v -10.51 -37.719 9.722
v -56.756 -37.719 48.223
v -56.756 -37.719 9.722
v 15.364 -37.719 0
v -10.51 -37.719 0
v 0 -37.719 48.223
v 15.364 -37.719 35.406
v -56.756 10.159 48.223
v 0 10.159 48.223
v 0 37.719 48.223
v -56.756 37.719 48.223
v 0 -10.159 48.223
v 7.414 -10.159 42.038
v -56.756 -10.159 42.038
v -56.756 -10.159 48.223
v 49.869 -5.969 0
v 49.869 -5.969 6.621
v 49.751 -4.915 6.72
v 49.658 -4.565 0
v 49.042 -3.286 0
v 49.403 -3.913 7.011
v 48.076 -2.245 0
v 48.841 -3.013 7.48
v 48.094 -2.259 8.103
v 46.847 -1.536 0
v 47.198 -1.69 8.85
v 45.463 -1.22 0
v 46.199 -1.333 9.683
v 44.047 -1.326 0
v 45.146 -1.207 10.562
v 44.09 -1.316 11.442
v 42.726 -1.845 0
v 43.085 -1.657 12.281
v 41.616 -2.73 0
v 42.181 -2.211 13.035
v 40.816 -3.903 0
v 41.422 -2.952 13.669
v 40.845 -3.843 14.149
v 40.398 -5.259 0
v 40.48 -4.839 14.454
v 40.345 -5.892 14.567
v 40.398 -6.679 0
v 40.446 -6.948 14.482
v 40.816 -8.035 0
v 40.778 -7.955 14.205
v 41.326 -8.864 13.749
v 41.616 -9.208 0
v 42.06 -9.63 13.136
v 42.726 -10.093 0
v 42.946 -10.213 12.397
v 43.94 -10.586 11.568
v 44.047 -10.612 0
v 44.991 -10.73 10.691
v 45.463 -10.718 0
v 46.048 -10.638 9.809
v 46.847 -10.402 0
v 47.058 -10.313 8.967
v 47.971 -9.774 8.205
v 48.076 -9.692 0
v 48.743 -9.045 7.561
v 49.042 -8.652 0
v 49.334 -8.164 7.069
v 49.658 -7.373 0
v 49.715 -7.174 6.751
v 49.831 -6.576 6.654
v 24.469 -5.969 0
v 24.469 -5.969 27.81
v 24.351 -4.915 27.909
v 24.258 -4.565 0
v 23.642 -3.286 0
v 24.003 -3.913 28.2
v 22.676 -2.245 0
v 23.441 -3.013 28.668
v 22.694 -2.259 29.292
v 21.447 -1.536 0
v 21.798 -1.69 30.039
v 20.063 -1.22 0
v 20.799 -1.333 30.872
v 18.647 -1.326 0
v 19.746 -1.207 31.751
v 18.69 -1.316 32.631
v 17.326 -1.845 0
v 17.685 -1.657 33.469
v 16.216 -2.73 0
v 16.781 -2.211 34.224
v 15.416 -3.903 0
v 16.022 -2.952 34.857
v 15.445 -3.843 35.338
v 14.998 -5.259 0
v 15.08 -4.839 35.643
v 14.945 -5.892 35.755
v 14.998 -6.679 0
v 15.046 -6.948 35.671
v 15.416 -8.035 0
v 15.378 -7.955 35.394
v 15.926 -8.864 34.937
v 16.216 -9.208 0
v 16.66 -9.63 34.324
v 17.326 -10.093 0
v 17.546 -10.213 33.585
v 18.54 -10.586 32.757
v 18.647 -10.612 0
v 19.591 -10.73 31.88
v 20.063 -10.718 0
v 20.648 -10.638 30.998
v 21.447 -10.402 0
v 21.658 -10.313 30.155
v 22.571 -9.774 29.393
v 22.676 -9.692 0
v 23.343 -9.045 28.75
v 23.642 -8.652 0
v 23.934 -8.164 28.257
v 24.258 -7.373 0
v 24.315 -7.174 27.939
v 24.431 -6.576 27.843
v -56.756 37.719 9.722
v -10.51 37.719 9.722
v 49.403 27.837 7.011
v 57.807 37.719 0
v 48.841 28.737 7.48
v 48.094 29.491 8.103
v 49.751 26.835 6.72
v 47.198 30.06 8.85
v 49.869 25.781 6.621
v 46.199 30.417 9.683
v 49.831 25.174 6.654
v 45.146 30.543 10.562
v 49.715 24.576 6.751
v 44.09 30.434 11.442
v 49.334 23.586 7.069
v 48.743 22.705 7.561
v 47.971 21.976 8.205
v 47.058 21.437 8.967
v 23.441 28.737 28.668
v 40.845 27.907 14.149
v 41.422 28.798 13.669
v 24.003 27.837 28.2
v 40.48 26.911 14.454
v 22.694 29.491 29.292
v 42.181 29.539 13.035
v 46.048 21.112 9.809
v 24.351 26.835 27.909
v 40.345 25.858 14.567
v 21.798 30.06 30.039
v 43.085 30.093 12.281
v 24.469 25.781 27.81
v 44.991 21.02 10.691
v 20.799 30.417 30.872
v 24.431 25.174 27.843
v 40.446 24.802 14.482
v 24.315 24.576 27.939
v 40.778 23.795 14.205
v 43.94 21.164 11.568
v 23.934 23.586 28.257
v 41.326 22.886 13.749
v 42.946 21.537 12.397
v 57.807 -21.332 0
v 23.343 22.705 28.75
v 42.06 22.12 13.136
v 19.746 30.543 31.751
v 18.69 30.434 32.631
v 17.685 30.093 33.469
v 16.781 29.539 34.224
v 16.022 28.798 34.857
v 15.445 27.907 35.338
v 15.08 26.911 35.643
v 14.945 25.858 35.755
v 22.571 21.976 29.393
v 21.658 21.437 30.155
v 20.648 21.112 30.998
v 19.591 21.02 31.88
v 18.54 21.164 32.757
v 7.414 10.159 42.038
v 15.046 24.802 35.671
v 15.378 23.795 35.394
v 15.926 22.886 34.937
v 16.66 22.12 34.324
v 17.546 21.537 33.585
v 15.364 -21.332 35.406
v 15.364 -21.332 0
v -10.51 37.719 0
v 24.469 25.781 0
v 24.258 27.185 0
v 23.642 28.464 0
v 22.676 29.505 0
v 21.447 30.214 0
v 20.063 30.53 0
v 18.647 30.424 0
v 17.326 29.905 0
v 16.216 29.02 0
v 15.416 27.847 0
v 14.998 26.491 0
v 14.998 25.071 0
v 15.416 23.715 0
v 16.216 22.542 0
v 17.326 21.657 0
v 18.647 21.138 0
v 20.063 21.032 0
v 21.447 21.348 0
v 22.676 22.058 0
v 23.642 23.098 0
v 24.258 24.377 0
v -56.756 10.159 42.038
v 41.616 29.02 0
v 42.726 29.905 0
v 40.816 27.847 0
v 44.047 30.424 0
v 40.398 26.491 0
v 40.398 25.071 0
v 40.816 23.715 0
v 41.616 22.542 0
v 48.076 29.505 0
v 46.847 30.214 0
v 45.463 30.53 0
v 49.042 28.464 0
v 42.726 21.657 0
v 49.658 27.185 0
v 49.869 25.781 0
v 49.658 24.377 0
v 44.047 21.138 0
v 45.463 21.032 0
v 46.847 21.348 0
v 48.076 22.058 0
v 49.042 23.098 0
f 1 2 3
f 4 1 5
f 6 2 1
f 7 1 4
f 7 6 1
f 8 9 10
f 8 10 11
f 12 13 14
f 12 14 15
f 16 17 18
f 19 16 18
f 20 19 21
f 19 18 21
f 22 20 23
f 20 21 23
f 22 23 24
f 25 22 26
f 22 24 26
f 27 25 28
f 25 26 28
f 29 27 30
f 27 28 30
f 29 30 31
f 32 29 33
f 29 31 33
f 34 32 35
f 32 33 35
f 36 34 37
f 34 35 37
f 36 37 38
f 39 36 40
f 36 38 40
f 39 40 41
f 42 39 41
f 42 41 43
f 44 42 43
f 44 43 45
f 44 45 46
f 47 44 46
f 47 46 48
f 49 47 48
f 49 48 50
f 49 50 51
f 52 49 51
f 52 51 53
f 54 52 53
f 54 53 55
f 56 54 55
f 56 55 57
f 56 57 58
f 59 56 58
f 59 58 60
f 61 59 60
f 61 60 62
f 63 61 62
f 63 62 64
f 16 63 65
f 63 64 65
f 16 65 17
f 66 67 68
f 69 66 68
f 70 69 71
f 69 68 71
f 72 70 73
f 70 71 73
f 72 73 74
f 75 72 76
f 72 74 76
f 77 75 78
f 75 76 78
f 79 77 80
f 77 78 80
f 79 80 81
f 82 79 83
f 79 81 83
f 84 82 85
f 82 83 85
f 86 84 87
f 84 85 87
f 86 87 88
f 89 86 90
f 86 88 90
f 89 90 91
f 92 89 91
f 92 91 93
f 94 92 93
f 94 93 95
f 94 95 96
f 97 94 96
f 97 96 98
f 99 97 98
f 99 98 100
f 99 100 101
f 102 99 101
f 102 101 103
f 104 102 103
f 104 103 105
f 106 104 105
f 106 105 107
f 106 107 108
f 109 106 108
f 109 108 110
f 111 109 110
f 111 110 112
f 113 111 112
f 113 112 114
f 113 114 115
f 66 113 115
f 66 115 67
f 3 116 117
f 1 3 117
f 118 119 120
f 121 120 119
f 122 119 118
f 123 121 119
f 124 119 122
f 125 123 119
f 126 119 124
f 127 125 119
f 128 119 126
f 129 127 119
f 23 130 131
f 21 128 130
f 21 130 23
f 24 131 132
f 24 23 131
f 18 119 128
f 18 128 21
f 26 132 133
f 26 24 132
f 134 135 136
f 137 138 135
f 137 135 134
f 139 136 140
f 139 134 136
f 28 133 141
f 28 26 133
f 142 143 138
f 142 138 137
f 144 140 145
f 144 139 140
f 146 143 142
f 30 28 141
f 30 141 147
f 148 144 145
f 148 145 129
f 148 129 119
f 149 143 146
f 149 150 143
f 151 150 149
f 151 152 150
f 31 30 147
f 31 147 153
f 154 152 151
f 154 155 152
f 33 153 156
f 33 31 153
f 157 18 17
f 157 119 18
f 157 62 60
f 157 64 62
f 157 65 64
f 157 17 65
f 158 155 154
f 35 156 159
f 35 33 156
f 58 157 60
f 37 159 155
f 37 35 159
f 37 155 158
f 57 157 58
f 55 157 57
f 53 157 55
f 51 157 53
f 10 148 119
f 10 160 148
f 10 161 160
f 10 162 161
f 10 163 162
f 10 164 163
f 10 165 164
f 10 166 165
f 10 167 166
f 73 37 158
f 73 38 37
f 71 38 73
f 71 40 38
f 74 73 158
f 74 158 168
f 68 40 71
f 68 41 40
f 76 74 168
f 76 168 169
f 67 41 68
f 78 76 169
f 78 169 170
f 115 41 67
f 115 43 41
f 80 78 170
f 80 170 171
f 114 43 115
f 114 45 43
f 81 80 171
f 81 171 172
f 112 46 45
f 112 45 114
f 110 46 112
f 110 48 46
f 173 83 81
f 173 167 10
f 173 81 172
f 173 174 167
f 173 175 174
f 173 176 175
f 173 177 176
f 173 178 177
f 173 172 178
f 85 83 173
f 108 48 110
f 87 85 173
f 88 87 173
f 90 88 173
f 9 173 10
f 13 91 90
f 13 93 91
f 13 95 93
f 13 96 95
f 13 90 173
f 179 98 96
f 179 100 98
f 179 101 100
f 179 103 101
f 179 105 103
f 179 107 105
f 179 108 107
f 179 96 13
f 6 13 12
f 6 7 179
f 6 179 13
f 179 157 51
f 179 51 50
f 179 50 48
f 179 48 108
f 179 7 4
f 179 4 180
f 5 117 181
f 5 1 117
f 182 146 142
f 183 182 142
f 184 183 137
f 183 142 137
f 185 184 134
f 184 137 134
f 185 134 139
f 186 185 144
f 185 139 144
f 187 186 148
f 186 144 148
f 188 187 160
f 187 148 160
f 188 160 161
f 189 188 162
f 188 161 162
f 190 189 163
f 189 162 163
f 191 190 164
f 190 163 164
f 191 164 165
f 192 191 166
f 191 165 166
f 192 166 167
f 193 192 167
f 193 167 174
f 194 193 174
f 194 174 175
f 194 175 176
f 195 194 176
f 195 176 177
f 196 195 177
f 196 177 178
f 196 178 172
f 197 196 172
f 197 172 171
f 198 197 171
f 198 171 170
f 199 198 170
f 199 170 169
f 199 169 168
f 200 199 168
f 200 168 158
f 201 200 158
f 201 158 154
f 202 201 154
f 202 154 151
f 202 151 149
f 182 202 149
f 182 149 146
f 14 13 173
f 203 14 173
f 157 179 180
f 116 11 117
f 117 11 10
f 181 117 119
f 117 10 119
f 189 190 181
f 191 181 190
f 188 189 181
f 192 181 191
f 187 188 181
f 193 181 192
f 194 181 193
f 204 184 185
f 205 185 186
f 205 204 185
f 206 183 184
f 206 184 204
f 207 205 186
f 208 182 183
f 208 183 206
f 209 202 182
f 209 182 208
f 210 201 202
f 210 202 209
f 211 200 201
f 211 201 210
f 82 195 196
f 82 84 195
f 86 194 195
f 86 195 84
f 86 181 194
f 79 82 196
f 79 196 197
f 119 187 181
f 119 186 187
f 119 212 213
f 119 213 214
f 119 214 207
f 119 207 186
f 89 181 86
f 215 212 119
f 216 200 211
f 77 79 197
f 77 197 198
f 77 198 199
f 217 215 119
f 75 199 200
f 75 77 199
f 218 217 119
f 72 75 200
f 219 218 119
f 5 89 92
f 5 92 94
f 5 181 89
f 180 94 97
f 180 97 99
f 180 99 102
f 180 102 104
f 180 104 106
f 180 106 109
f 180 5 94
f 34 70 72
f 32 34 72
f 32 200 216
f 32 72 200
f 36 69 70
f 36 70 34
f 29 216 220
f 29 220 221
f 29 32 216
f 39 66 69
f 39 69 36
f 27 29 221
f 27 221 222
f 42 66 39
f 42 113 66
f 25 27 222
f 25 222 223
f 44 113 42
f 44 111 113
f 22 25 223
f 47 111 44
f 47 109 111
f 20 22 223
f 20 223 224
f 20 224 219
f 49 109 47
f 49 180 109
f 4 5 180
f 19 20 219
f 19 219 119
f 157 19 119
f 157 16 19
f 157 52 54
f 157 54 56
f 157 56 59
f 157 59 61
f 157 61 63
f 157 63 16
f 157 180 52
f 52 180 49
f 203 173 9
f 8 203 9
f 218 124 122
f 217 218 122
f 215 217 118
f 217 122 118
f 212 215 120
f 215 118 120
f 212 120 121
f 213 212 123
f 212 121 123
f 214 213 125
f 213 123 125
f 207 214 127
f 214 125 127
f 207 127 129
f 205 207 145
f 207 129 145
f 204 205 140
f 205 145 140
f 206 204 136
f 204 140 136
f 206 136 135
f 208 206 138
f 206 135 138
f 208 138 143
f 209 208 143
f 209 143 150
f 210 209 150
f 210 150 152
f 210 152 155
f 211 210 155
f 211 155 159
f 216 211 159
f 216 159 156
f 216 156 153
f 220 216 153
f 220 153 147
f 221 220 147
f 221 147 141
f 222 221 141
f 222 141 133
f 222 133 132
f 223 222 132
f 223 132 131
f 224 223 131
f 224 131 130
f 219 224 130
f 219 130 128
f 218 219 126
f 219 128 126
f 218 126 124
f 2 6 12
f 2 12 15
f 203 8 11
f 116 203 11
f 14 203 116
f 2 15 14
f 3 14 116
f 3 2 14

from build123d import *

# Parameters (mm, degrees)
F1_DEPTH      = 37.718965
F2_W          = 42.4428796396
F2_H          = 16.3872130215
F3_DEPTH      = 48.2236520451
F4_W          = 20.3172173351
F4_H          = 6.184624848
F5_DEPTH      = 56.7568631301
F5_DEPTH_BACK = 57.8078979084
F6_R          = 4.7625
F7_DEPTH      = 48.2236520451


with BuildPart() as f1:
    # F0 (on Front) → F1 (new body, symmetric)
    with BuildSketch(Plane.XZ):
        Polygon((-10.5103449896, 0), (57.8068979084, 0), (0, 48.2226520451), (-56.7558631301, 48.2226520451), (-56.7558631301, 9.7220684111), (-10.5103449896, 9.7220684111), align=None)
    extrude(amount=F1_DEPTH, both=True)

    # F2 (on face) → F3 (cut, through all)
    with BuildSketch(Plane.XY.offset(48.2226520451)):
        with Locations((36.5854580887, -29.5253584892)):
            Rectangle(F2_W, F2_H)
    extrude(amount=-F3_DEPTH, mode=Mode.SUBTRACT)

    # F4 (on Right) → F5 (cut, two sides)
    with BuildSketch(Plane.YZ) as f5_sk:
        with Locations((0, 45.1303396211)):
            Rectangle(F4_W, F4_H)
    extrude(amount=-F5_DEPTH, mode=Mode.SUBTRACT)
    extrude(f5_sk.sketch, amount=F5_DEPTH_BACK, mode=Mode.SUBTRACT)

    # F6 (on face) → F7 (cut, through all)
    with BuildSketch(Plane.XY.offset(48.2226520451)):
        with Locations((45.1068979084, 25.781035)):
            Circle(F6_R)
        with Locations((19.7068979084, 25.781035)):
            Circle(F6_R)
        with Locations((19.7068979084, -5.968965)):
            Circle(F6_R)
        with Locations((45.1068979084, -5.968965)):
            Circle(F6_R)
    extrude(amount=-F7_DEPTH, mode=Mode.SUBTRACT)


solid = f1.part
